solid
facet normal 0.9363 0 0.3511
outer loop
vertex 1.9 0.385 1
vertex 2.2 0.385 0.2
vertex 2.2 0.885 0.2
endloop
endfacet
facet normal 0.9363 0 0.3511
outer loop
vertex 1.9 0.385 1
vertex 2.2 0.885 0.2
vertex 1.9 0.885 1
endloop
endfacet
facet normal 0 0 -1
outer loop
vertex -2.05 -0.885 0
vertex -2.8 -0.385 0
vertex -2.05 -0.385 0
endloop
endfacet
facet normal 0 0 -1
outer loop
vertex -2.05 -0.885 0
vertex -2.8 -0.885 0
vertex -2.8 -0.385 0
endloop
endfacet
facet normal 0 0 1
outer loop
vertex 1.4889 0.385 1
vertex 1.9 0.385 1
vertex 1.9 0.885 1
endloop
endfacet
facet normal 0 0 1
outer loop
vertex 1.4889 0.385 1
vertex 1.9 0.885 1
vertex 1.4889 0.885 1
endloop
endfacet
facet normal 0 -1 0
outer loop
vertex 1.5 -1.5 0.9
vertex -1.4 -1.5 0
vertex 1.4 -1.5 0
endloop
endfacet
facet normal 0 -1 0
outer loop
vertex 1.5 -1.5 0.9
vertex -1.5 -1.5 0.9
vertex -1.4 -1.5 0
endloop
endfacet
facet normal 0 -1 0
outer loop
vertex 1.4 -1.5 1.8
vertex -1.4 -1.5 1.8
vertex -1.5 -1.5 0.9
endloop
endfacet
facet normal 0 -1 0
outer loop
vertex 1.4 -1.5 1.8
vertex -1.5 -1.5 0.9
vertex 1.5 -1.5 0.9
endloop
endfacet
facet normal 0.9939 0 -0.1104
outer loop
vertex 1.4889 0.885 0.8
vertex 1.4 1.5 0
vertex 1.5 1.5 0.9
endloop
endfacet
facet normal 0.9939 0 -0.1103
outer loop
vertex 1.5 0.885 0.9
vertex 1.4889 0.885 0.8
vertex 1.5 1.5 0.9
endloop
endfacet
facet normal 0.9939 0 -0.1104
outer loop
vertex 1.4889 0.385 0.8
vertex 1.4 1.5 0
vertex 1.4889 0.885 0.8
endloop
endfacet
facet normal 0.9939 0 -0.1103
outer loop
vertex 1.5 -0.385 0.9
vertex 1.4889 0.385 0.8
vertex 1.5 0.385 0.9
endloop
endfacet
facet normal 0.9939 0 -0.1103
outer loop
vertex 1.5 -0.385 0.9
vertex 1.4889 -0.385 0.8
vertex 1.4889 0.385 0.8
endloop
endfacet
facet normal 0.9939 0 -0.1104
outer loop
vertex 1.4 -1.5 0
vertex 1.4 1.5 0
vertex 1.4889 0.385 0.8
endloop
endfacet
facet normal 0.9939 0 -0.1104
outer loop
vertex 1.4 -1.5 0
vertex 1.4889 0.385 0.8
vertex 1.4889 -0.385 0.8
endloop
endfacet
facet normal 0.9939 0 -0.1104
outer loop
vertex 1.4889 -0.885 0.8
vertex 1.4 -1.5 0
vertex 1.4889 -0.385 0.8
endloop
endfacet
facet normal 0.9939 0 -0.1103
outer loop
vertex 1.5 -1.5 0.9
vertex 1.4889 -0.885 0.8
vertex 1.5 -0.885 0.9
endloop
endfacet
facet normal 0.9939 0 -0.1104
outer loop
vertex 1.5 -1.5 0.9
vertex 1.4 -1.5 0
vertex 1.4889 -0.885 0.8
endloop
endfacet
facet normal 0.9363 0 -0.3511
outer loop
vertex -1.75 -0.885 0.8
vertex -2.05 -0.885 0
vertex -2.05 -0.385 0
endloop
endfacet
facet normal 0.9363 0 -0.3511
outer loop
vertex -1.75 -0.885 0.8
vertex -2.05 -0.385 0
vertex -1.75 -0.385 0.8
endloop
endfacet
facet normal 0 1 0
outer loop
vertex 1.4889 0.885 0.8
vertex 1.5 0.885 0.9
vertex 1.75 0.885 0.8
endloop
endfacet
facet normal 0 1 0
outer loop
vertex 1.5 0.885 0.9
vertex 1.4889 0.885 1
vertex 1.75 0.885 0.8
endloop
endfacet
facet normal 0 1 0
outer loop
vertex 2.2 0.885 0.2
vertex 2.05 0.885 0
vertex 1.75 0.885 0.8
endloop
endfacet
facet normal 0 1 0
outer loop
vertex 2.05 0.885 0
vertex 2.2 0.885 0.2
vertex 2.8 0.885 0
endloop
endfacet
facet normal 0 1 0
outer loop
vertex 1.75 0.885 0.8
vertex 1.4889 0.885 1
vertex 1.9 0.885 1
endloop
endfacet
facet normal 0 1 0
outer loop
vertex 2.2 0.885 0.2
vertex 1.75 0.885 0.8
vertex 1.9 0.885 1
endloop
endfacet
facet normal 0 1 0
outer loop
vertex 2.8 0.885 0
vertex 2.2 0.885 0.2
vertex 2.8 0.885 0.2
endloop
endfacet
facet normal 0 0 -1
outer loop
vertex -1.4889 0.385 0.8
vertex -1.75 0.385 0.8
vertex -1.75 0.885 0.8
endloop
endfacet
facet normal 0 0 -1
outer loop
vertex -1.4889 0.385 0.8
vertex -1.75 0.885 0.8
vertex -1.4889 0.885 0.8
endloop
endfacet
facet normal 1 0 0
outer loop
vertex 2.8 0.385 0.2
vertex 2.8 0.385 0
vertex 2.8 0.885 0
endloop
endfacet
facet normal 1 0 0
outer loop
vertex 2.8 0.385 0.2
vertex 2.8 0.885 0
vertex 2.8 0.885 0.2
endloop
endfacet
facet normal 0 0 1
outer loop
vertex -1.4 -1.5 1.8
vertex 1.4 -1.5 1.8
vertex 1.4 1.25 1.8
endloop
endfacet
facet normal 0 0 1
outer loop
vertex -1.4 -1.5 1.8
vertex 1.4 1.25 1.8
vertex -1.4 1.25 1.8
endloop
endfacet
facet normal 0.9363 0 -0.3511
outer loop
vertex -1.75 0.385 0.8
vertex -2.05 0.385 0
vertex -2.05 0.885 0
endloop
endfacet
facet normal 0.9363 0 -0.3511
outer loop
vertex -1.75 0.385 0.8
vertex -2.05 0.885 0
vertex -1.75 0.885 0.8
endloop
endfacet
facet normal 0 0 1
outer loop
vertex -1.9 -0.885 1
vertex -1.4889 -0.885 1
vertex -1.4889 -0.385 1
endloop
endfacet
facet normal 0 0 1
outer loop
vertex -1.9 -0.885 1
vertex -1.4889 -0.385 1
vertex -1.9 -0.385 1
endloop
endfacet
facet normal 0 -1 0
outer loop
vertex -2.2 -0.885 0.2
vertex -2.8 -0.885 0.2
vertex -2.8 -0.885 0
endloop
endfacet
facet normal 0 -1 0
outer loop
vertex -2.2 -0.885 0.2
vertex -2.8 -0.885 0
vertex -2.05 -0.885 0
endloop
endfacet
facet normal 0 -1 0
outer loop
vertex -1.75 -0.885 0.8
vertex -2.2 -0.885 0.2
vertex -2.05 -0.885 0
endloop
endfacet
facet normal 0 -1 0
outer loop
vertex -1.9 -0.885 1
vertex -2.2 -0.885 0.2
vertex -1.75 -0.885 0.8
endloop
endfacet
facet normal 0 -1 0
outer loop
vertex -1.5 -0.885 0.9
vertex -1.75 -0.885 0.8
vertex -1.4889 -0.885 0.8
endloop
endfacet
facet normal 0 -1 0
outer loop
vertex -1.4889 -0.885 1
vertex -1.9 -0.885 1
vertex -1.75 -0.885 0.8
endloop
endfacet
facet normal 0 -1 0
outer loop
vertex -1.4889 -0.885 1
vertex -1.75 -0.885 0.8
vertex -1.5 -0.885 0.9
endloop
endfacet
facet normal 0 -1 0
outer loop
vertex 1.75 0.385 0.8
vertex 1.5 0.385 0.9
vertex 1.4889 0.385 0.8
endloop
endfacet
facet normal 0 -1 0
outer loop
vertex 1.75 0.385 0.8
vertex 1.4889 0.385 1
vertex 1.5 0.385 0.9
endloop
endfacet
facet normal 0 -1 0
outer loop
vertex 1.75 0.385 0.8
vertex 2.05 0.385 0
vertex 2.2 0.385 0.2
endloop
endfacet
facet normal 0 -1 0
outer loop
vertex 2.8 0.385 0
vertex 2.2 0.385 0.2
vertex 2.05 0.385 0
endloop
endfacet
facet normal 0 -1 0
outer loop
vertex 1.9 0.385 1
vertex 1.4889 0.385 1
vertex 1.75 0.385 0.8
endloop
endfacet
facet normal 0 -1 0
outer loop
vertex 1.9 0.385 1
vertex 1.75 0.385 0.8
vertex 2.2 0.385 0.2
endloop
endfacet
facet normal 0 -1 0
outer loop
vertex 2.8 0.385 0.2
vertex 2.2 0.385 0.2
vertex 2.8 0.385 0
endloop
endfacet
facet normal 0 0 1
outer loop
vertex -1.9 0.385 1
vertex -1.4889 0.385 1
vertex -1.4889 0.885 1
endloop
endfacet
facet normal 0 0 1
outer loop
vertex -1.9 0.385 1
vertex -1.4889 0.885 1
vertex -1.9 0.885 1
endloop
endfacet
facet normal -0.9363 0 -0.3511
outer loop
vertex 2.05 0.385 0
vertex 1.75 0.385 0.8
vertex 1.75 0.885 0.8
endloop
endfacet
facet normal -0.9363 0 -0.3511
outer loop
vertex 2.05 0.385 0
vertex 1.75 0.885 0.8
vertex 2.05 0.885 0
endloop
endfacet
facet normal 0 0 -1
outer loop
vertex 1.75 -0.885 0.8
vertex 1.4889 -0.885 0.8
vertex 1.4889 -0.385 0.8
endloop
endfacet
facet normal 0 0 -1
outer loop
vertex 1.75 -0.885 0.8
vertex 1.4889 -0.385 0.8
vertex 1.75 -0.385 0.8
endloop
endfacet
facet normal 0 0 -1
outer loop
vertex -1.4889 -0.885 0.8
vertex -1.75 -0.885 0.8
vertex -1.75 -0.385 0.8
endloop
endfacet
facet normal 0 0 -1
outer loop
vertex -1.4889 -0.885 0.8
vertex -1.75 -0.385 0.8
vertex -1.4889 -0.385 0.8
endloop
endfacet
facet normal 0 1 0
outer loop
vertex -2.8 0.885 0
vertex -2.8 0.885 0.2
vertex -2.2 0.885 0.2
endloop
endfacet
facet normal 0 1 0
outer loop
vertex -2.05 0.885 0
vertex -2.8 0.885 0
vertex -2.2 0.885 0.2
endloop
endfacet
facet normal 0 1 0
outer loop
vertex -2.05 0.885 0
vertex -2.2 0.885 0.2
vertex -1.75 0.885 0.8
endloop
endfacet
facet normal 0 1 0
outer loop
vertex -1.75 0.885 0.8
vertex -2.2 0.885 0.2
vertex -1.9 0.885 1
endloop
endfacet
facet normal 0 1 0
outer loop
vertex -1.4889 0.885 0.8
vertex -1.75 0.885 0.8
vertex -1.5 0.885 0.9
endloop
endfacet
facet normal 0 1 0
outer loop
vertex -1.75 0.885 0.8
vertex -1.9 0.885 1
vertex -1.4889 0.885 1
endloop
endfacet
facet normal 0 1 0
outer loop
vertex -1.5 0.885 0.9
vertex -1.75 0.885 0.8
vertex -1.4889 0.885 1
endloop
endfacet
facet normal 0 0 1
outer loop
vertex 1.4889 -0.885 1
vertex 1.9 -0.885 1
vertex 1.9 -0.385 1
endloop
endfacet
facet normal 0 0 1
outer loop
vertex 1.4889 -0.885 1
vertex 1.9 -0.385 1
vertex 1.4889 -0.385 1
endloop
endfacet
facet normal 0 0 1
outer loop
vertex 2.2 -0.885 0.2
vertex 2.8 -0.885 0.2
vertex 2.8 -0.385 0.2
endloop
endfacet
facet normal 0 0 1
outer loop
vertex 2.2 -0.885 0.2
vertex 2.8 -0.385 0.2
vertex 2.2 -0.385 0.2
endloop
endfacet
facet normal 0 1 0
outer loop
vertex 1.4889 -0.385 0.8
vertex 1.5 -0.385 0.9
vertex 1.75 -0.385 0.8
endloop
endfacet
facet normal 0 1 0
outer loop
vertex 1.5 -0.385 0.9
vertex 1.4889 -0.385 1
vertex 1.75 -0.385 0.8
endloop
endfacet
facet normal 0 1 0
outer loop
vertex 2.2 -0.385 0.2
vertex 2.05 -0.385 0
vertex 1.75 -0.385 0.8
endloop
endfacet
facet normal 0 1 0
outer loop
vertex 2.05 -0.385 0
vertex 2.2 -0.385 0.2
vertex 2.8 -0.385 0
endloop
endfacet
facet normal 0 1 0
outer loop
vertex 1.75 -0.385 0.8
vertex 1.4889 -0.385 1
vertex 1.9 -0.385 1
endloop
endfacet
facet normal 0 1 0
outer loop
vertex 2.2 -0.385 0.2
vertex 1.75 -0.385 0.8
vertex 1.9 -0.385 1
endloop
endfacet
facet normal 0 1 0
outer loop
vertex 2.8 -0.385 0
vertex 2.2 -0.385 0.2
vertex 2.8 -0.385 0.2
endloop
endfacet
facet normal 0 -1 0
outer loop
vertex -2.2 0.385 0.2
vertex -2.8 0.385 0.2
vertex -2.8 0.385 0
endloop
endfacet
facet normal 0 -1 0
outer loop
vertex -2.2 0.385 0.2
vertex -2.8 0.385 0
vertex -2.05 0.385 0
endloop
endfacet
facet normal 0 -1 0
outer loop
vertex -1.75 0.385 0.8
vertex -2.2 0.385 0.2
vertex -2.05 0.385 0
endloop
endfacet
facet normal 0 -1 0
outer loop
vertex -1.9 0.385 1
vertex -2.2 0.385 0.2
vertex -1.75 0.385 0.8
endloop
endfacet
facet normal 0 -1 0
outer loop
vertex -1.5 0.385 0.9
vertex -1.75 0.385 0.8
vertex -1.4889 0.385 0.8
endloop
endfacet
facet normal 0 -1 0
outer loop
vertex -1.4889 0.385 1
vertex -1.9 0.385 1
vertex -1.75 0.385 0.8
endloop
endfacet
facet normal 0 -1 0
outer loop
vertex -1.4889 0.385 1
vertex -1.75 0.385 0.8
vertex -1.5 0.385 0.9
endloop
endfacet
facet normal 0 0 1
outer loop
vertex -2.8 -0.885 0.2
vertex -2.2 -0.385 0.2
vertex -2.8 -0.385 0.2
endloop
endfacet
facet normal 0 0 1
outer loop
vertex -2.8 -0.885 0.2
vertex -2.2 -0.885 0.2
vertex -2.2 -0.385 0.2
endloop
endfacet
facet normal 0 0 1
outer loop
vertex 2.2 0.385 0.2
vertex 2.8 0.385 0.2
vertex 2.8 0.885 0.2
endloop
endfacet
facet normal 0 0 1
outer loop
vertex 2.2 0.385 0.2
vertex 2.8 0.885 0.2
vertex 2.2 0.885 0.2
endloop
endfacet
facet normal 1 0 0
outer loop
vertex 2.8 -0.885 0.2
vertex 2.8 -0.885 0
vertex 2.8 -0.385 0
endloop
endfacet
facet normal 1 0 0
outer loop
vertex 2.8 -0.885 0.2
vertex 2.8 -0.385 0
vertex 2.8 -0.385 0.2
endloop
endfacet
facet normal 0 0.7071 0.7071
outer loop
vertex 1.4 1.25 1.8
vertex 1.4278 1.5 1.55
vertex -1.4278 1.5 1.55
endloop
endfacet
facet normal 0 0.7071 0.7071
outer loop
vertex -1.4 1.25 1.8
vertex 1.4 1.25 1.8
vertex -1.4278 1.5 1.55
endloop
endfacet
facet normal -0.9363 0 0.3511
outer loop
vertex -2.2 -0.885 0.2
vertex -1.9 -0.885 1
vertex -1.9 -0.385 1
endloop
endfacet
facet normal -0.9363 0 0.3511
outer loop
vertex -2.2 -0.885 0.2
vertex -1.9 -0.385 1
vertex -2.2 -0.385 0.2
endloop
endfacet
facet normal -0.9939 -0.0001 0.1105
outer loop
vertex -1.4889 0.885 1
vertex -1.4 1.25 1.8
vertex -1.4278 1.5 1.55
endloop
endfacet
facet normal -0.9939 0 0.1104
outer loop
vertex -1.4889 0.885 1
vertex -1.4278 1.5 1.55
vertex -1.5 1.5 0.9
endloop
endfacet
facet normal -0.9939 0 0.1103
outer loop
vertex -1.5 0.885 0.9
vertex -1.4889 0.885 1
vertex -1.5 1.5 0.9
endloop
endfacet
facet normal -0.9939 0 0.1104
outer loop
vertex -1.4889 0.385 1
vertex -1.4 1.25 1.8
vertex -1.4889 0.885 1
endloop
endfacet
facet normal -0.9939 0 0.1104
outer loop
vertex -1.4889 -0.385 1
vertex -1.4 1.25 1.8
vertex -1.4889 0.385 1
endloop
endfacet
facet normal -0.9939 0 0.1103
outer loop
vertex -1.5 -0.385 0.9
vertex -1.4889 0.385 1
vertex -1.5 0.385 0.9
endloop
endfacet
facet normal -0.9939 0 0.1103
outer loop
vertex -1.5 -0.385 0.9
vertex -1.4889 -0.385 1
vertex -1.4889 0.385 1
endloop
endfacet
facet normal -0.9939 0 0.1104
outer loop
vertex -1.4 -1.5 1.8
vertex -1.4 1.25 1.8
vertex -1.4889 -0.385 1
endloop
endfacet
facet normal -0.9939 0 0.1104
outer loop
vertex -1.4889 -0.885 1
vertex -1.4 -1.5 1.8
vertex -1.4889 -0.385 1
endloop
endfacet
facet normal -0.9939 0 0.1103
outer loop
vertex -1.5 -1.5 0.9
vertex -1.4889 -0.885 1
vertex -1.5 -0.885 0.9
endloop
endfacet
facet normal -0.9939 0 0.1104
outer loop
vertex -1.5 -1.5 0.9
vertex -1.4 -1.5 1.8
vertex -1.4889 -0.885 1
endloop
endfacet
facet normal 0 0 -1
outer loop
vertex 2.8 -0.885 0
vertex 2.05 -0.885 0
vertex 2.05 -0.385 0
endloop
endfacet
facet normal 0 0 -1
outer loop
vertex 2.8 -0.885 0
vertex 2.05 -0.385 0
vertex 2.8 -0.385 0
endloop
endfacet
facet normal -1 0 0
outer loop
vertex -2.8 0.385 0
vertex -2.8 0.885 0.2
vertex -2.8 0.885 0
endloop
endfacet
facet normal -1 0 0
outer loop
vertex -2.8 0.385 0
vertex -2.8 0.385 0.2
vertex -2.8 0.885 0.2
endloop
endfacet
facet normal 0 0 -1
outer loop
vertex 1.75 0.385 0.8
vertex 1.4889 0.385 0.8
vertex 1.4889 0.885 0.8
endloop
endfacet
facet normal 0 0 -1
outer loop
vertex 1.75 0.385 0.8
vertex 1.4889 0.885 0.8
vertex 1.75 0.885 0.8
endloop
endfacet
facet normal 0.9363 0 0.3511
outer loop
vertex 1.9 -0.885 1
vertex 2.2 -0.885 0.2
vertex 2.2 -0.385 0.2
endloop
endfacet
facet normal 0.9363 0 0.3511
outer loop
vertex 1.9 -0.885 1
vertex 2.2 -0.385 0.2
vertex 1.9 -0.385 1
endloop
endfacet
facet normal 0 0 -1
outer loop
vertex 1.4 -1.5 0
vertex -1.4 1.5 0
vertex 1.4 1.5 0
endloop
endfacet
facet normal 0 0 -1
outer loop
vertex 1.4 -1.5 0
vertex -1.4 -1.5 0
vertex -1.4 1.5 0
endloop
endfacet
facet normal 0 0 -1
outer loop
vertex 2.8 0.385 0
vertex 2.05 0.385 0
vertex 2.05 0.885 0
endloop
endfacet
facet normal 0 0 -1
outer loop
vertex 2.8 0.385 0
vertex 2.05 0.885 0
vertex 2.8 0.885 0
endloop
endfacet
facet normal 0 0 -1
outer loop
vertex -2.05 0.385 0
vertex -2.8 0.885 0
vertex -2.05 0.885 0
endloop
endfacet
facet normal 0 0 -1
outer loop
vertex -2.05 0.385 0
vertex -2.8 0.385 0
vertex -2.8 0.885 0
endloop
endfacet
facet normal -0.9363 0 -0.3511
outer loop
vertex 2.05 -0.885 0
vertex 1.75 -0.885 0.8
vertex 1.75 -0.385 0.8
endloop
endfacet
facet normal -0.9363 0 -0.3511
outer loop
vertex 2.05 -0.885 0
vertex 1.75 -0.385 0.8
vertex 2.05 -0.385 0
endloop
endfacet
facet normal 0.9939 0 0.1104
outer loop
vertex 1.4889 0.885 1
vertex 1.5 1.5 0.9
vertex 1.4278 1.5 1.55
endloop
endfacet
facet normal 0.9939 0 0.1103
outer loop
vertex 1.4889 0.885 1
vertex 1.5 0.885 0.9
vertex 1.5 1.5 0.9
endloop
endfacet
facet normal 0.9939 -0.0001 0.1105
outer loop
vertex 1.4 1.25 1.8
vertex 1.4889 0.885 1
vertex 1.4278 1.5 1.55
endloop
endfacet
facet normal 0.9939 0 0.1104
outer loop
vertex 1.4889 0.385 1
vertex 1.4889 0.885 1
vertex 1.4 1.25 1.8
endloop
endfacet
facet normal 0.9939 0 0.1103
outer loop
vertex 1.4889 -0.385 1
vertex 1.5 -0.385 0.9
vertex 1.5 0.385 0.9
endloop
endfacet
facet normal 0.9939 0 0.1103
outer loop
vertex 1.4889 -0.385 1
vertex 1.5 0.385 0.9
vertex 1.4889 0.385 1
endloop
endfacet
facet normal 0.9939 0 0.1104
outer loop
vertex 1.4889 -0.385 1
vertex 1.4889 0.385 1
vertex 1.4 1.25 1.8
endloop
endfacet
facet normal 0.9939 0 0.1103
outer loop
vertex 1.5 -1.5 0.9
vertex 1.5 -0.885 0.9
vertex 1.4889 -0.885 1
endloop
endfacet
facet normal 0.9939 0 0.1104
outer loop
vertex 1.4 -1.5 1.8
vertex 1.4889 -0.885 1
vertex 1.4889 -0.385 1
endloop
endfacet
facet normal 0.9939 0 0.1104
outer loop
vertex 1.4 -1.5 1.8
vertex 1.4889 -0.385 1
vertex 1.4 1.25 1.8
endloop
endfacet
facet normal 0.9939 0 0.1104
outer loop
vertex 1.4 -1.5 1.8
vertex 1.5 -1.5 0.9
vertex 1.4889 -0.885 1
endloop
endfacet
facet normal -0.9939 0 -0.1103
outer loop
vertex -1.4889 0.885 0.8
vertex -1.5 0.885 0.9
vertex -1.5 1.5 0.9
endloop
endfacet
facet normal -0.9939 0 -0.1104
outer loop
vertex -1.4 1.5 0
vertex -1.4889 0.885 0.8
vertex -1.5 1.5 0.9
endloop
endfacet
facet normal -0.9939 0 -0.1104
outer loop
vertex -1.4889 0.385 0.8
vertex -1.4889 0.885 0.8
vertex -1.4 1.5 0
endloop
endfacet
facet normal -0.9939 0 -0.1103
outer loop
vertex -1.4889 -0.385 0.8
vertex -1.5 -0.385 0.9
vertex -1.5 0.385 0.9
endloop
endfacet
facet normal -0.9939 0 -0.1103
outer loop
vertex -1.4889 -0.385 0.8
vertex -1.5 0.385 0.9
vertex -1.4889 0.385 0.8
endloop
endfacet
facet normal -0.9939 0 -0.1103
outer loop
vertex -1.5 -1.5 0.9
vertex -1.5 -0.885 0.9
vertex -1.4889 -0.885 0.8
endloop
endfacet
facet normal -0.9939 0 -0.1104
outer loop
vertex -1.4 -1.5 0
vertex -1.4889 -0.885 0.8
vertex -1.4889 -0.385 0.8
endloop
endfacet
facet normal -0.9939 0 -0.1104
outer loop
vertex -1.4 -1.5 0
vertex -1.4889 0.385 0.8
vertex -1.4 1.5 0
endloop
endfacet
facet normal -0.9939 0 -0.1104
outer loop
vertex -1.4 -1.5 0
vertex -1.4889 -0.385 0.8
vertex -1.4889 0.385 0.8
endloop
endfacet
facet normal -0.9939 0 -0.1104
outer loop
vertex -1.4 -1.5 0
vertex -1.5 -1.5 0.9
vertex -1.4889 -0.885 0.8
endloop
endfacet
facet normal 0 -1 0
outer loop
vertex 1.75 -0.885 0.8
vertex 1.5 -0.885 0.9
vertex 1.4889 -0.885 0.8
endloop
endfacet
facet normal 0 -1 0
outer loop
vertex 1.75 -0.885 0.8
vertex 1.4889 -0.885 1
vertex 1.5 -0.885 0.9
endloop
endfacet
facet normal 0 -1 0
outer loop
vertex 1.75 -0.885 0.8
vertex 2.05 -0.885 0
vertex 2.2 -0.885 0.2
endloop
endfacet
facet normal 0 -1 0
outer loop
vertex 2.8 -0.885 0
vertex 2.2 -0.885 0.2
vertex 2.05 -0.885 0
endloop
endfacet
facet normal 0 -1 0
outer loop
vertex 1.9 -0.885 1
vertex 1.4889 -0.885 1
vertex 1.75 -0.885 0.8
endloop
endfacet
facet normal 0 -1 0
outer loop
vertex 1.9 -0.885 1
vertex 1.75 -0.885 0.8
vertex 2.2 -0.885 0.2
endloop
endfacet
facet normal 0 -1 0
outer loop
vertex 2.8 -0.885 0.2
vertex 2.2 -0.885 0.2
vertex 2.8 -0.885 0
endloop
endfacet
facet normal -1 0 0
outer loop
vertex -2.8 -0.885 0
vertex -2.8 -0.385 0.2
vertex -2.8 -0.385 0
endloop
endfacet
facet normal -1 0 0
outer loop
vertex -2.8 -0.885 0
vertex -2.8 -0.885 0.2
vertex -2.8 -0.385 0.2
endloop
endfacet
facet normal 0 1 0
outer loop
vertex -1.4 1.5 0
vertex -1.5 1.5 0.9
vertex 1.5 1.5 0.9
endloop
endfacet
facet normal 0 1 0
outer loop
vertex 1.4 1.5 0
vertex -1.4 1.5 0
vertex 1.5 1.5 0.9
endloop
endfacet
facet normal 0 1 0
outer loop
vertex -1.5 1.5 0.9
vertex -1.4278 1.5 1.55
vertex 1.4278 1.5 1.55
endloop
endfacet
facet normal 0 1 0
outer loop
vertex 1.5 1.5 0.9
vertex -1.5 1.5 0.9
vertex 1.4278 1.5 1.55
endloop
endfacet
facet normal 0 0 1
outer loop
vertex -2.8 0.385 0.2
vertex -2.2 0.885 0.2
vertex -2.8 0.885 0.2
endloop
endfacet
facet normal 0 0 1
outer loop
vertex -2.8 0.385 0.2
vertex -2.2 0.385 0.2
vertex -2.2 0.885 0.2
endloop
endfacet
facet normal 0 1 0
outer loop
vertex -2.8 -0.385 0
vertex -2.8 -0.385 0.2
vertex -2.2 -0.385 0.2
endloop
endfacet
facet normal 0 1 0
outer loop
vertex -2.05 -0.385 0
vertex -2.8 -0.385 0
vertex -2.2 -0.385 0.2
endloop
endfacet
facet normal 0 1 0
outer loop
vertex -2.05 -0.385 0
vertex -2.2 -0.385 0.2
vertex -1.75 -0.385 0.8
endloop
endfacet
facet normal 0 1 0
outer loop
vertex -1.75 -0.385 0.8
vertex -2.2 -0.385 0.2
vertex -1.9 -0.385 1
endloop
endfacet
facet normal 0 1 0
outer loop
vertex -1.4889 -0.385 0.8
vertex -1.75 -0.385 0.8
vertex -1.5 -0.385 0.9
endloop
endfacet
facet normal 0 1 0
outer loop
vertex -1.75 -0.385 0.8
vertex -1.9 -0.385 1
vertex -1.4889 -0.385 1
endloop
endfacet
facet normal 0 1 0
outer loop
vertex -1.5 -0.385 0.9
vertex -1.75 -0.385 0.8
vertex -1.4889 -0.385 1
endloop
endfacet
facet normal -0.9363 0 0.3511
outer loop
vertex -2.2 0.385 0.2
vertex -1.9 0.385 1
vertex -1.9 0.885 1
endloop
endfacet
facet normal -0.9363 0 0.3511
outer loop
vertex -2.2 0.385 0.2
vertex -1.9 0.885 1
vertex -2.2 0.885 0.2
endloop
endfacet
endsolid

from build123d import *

# Parameters (mm, degrees)
PAD002_DEPTH = 0.25
PAD003_DEPTH = 0.25
PAD_DEPTH    = 1.5
CHAMFER_SIZE = 0.25


with BuildPart() as pad002:
    # Sketch002 → Pad002 (new body, symmetric)
    with BuildSketch(Plane.XZ.offset(-0.635)):
        Polygon((-2.8, 0), (-2.05, 0), (-1.75, 0.8), (1.75, 0.8), (2.05, 0), (2.8, 0), (2.8, 0.2), (2.2, 0.2), (1.9, 1), (-1.9, 1), (-2.2, 0.2), (-2.8, 0.2), align=None)
    extrude(amount=PAD002_DEPTH, both=True)


with BuildPart() as pad003:
    # Sketch003 → Pad003 (new body, symmetric)
    with BuildSketch(Plane.XZ.offset(0.635)):
        Polygon((-2.8, 0), (-2.05, 0), (-1.75, 0.8), (1.75, 0.8), (2.05, 0), (2.8, 0), (2.8, 0.2), (2.2, 0.2), (1.9, 1), (-1.9, 1), (-2.2, 0.2), (-2.8, 0.2), align=None)
    extrude(amount=PAD003_DEPTH, both=True)


with BuildPart() as chamfer_mp_cp:
    # Sketch → Pad (new body, symmetric)
    with BuildSketch(Plane.XZ):
        Polygon((-1.4, 0), (1.4, 0), (1.5, 0.9), (1.4, 1.8), (-1.4, 1.8), (-1.5, 0.9), align=None)
    extrude(amount=PAD_DEPTH, both=True)

    # Chamfer
    chamfer_edges = [chamfer_mp_cp.edges().sort_by_distance(p)[0] for p in [
        (0, 1.5, 1.8),
    ]]
    chamfer(chamfer_edges, length=CHAMFER_SIZE)

    # Chamfer_mp_cp: union Pad002, Pad003
    add(pad002.part)
    add(pad003.part)


solid = chamfer_mp_cp.part
